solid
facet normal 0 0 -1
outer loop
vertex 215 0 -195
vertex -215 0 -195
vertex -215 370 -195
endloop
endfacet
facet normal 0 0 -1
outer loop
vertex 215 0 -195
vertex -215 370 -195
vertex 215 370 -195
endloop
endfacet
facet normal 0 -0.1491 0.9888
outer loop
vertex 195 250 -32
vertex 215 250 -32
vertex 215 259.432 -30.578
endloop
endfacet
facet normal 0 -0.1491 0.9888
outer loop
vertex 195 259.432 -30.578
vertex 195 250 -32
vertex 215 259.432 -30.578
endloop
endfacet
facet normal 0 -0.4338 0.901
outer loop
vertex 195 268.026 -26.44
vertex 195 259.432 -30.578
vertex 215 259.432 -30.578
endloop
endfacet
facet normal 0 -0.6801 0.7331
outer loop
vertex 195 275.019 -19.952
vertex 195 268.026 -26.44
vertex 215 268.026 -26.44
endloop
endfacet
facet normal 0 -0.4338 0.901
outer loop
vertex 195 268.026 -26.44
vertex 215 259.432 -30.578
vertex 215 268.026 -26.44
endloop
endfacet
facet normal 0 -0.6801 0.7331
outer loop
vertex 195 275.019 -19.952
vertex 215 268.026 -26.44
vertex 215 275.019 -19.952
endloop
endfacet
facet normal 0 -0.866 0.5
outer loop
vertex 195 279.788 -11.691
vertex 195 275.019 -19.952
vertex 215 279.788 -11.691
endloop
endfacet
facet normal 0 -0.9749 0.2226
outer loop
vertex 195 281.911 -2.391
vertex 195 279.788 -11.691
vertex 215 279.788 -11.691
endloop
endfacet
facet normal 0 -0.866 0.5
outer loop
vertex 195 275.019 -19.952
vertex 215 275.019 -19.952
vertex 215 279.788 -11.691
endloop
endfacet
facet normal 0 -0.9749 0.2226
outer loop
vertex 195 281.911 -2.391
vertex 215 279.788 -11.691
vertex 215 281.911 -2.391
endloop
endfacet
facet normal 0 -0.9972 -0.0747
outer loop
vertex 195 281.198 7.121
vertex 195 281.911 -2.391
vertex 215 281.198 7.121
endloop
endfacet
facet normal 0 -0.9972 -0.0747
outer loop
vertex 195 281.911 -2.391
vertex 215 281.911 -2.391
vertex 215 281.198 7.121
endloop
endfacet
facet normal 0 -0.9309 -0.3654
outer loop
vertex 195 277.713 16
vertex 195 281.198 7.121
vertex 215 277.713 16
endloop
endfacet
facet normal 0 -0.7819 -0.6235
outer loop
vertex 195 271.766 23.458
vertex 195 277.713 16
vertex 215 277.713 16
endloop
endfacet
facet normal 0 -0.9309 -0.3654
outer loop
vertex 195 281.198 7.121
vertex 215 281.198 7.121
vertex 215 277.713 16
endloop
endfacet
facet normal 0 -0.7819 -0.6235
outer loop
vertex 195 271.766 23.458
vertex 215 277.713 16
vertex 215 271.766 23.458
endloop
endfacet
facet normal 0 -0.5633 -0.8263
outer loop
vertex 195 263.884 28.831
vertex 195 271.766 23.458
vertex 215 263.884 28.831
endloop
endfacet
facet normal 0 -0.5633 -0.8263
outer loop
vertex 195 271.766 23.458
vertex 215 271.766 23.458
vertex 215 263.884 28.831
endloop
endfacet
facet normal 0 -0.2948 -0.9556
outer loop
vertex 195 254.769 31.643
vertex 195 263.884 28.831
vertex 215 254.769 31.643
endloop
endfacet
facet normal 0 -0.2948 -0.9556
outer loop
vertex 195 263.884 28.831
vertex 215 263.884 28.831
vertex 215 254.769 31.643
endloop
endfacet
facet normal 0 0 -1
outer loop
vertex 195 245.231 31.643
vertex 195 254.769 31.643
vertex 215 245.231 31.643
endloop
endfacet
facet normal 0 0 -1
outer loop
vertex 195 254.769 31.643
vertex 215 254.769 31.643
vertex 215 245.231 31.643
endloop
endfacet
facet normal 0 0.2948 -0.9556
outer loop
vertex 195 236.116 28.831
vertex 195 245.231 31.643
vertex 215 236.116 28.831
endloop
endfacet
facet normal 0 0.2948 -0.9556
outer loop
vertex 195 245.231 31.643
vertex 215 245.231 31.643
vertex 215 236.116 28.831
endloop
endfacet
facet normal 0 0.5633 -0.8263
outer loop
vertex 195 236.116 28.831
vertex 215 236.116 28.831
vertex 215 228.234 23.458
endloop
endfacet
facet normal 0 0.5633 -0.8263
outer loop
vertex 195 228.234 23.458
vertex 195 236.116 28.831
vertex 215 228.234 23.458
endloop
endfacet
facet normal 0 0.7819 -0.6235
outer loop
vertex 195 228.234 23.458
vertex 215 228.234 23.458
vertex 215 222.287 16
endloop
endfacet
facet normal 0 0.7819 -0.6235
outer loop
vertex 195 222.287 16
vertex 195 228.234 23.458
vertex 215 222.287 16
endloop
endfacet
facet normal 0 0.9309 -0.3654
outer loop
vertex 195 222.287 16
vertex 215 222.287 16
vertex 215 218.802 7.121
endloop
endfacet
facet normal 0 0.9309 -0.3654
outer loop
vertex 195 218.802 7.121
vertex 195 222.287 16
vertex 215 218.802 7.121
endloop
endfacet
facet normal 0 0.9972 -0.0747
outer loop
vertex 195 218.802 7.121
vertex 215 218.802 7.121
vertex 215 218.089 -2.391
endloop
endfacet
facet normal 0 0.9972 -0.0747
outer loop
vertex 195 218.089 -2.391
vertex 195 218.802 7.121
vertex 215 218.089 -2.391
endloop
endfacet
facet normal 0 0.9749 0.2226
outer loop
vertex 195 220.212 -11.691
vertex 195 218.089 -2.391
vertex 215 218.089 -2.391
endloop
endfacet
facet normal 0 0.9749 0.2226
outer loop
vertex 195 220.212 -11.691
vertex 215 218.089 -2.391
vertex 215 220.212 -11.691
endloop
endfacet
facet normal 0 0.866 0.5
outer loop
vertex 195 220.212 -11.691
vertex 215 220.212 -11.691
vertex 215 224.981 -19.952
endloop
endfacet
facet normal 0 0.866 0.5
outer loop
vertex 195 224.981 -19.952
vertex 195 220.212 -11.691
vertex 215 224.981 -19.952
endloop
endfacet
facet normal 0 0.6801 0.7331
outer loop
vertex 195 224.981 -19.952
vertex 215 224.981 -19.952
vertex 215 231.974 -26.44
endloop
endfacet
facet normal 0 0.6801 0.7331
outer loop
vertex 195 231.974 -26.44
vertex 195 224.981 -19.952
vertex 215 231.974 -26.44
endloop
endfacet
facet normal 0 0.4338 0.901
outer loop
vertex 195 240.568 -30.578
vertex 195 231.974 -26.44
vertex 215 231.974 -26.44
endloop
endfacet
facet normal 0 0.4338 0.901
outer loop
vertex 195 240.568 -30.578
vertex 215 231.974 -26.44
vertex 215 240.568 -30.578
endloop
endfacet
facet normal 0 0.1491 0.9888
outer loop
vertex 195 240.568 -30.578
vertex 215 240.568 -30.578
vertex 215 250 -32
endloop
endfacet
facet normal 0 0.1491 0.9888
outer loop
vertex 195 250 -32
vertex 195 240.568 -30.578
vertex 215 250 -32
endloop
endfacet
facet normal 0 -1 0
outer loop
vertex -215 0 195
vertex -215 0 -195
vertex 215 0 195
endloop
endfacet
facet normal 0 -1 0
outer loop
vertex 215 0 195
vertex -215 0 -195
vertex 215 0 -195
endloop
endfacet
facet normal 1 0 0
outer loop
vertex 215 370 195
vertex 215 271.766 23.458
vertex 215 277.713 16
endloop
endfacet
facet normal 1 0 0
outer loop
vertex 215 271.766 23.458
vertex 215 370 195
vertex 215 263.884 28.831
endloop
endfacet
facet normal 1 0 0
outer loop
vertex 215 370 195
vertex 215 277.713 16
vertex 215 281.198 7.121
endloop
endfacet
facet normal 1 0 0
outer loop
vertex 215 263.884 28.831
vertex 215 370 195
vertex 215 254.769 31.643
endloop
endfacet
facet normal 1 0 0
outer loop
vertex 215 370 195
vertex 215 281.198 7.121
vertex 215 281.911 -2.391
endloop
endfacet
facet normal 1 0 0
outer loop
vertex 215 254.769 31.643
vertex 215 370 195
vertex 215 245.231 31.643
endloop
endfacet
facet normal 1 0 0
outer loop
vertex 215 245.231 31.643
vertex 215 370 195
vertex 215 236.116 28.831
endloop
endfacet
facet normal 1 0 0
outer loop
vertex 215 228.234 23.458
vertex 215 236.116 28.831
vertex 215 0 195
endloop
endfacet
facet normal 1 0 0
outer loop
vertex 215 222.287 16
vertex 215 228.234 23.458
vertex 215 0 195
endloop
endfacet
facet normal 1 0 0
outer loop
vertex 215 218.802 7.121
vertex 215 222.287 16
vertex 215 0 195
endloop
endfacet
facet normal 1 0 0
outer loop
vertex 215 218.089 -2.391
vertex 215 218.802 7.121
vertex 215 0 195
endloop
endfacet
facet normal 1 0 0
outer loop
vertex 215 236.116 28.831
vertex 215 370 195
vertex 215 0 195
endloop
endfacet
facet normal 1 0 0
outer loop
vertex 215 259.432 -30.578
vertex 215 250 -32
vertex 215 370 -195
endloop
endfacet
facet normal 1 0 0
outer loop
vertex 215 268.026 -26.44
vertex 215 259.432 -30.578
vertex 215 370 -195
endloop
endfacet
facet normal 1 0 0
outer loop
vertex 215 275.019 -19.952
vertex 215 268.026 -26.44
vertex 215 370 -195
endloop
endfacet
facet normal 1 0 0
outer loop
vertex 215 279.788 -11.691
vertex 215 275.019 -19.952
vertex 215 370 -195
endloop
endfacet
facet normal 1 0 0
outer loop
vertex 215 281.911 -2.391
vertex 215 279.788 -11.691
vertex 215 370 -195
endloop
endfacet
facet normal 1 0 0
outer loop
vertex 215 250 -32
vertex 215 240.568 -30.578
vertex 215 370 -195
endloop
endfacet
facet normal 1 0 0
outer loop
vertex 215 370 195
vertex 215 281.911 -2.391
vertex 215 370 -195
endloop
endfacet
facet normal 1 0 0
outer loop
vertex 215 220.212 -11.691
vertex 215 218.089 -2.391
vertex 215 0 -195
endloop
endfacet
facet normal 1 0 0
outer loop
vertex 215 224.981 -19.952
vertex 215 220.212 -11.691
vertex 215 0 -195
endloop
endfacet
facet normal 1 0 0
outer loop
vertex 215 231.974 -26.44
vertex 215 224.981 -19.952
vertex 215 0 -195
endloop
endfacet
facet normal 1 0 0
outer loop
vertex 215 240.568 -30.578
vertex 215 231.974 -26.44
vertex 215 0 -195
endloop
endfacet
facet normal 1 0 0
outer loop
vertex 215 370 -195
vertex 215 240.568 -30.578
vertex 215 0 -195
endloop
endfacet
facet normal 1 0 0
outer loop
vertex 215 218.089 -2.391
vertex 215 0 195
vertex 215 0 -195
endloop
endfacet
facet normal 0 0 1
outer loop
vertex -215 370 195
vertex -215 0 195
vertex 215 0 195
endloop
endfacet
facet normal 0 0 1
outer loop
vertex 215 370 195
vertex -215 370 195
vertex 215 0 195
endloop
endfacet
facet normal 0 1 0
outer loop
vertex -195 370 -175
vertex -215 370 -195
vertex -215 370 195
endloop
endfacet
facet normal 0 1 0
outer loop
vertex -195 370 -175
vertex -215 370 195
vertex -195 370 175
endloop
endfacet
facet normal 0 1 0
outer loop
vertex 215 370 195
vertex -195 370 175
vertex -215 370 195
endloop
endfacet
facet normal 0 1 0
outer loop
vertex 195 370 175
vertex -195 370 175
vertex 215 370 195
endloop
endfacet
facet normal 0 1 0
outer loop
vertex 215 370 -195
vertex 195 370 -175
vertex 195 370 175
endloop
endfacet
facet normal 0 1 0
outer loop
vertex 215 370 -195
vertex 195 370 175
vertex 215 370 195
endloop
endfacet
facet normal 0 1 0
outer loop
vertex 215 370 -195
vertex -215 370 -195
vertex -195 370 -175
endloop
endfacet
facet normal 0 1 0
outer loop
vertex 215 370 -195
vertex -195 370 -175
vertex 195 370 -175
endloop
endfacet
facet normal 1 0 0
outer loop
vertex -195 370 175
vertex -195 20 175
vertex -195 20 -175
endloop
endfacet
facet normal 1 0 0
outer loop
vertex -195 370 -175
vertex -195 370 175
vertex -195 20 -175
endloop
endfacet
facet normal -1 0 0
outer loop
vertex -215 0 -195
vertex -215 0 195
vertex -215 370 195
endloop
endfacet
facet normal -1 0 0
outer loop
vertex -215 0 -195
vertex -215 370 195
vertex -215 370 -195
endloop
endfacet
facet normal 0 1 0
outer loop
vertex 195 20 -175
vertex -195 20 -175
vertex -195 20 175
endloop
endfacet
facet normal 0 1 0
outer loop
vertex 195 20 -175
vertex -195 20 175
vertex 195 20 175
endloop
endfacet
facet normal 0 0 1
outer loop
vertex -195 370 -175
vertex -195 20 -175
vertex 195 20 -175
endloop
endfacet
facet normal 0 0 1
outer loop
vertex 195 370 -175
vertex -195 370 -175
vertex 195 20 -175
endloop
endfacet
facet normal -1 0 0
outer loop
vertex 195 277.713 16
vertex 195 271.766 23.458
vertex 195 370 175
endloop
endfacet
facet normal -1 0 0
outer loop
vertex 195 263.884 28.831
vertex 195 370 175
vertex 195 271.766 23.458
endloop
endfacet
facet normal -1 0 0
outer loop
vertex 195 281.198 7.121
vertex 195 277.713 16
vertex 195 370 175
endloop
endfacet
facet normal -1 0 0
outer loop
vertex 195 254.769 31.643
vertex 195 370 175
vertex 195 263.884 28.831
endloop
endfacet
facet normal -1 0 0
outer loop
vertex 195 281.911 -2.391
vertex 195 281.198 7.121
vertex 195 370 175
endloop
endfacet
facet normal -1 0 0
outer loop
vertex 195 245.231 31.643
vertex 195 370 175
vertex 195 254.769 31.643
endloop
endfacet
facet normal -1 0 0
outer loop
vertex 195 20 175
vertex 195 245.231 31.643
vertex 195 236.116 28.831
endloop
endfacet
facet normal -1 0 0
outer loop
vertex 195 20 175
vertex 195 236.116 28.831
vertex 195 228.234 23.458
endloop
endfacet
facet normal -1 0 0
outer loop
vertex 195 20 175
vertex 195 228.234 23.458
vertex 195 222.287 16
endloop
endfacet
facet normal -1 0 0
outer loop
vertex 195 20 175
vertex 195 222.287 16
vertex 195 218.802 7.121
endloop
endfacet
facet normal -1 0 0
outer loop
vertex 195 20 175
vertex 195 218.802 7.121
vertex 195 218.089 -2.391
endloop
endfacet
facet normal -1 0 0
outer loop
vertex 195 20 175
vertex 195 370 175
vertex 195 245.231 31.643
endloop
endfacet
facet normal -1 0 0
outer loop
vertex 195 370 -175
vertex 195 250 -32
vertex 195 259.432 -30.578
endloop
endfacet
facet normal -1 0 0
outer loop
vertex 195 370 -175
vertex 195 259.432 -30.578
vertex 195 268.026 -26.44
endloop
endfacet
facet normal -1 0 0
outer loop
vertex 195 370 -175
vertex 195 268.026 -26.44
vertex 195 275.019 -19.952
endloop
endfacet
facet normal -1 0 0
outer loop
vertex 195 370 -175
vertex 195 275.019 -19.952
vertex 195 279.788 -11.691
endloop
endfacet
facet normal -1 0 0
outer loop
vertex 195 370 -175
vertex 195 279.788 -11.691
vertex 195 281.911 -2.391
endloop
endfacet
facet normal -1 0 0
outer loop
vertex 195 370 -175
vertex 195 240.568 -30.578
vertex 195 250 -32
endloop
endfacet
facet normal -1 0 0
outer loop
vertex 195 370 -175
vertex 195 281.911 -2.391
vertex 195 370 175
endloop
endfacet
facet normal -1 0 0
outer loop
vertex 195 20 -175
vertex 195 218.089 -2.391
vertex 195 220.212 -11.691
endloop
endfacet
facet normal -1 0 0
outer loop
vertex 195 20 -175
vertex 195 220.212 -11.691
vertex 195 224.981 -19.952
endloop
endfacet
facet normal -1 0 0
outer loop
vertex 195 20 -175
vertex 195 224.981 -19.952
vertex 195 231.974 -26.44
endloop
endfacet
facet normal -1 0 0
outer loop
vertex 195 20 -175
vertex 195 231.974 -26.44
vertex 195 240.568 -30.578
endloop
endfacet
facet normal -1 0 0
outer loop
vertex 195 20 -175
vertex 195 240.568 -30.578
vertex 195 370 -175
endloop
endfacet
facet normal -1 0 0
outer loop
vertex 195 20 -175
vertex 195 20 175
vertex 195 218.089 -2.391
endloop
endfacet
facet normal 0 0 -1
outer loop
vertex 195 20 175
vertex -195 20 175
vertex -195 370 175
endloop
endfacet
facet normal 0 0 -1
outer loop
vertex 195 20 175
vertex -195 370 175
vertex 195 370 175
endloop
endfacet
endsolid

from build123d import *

# Parameters (mm, degrees)
SKETCH1_W           = 430
SKETCH1_H           = 390
BOSS_EXTRUDE1_DEPTH = 370
SHELL1_T            = -20
CUT_EXTRUDE2_REACH  = 601.854
SKETCH2_R           = 32


with BuildPart() as part:
    # Sketch1 → Boss-Extrude1 (new body)
    with BuildSketch(Plane(origin=(0, 0, 0), x_dir=(1, 0, 0), z_dir=(0, 1, 0))):
        Rectangle(SKETCH1_W, SKETCH1_H)
    extrude(amount=BOSS_EXTRUDE1_DEPTH)

    # Shell1
    shell1_openings = [part.faces().sort_by_distance(p)[0] for p in [
        (0, 370, 0),
    ]]
    offset(amount=SHELL1_T, openings=shell1_openings, kind=Kind.INTERSECTION)

    # Sketch2 → Cut-Extrude2 (cut, up to next)
    with BuildSketch(Plane(origin=(215, 0, 0), x_dir=(0, 0, -1), z_dir=(1, 0, 0)), mode=Mode.PRIVATE) as cut_extrude2_sk1:
        with Locations((0, 250)):
            Circle(SKETCH2_R)
    cut_extrude2_tool1 = extrude(cut_extrude2_sk1.sketch, amount=-CUT_EXTRUDE2_REACH, mode=Mode.PRIVATE) & part.part
    add(cut_extrude2_tool1.solids().sort_by_distance((215, 250, 0))[0], mode=Mode.SUBTRACT)


solid = part.part
